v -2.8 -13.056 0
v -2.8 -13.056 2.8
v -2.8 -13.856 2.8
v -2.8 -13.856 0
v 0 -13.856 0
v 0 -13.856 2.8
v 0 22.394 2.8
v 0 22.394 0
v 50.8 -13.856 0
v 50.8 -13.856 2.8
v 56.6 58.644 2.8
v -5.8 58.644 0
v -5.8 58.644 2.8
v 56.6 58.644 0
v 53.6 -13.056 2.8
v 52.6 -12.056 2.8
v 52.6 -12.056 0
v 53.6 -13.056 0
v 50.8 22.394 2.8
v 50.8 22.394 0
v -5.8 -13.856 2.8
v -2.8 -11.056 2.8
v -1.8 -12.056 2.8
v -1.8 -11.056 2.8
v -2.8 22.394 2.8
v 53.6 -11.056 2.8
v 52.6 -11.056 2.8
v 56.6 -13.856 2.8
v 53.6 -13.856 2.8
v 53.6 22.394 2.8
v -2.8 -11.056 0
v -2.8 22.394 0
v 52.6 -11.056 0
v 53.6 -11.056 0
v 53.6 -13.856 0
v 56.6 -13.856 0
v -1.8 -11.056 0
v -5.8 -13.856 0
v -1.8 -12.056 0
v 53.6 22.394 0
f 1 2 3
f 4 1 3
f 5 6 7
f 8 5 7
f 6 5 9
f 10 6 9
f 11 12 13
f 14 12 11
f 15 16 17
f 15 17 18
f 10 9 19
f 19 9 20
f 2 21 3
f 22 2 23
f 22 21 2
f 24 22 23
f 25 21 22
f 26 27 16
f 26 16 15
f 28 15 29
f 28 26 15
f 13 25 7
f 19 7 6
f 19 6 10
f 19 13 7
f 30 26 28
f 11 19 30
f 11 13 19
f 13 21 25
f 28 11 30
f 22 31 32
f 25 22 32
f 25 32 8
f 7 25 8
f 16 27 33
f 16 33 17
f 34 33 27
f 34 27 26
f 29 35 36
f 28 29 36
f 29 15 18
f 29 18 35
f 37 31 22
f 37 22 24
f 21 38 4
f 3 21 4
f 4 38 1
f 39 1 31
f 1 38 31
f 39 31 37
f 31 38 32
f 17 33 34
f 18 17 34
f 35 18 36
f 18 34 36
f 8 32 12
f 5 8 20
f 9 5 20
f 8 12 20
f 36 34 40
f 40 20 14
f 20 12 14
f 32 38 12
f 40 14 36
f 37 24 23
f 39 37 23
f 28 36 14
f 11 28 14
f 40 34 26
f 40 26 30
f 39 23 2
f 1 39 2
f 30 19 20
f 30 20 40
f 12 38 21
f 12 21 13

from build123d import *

# Parameters (mm, degrees)
SKETCH1_W           = 62.4
SKETCH1_H           = 72.5
SKETCH1_W_2         = 2.8
SKETCH1_H_2         = 33.45
BOSS_EXTRUDE1_DEPTH = 2.8
CUT_EXTRUDE1_DEPTH  = 3.8


with BuildPart() as part:
    # Sketch1 → Boss-Extrude1 (new body)
    with BuildSketch(Plane.XY):
        with Locations((25.4, 22.394209189)):
            Rectangle(SKETCH1_W, SKETCH1_H)
        with Locations((-1.4, 5.669209189)):
            Rectangle(SKETCH1_W_2, SKETCH1_H_2, mode=Mode.SUBTRACT)
        with Locations((52.2, 5.669209189)):
            Rectangle(SKETCH1_W_2, SKETCH1_H_2, mode=Mode.SUBTRACT)
    extrude(amount=BOSS_EXTRUDE1_DEPTH)

    # Sketch2 → Cut-Extrude1 (cut, through all)
    with BuildSketch(Plane.XY.offset(2.8)):
        Polygon((0, -11.055790811), (-1.8, -11.055790811), (-1.8, -12.055790811), (-2.8, -13.055790811), (-2.8, -13.855790811), (0, -13.855790811), align=None)
    cut_extrude1 = extrude(amount=-CUT_EXTRUDE1_DEPTH, mode=Mode.SUBTRACT)

    # Mirror1: Cut-Extrude1 across plane
    add(cut_extrude1.mirror(Plane.ZY.offset(-25.4)), mode=Mode.SUBTRACT)


solid = part.part
